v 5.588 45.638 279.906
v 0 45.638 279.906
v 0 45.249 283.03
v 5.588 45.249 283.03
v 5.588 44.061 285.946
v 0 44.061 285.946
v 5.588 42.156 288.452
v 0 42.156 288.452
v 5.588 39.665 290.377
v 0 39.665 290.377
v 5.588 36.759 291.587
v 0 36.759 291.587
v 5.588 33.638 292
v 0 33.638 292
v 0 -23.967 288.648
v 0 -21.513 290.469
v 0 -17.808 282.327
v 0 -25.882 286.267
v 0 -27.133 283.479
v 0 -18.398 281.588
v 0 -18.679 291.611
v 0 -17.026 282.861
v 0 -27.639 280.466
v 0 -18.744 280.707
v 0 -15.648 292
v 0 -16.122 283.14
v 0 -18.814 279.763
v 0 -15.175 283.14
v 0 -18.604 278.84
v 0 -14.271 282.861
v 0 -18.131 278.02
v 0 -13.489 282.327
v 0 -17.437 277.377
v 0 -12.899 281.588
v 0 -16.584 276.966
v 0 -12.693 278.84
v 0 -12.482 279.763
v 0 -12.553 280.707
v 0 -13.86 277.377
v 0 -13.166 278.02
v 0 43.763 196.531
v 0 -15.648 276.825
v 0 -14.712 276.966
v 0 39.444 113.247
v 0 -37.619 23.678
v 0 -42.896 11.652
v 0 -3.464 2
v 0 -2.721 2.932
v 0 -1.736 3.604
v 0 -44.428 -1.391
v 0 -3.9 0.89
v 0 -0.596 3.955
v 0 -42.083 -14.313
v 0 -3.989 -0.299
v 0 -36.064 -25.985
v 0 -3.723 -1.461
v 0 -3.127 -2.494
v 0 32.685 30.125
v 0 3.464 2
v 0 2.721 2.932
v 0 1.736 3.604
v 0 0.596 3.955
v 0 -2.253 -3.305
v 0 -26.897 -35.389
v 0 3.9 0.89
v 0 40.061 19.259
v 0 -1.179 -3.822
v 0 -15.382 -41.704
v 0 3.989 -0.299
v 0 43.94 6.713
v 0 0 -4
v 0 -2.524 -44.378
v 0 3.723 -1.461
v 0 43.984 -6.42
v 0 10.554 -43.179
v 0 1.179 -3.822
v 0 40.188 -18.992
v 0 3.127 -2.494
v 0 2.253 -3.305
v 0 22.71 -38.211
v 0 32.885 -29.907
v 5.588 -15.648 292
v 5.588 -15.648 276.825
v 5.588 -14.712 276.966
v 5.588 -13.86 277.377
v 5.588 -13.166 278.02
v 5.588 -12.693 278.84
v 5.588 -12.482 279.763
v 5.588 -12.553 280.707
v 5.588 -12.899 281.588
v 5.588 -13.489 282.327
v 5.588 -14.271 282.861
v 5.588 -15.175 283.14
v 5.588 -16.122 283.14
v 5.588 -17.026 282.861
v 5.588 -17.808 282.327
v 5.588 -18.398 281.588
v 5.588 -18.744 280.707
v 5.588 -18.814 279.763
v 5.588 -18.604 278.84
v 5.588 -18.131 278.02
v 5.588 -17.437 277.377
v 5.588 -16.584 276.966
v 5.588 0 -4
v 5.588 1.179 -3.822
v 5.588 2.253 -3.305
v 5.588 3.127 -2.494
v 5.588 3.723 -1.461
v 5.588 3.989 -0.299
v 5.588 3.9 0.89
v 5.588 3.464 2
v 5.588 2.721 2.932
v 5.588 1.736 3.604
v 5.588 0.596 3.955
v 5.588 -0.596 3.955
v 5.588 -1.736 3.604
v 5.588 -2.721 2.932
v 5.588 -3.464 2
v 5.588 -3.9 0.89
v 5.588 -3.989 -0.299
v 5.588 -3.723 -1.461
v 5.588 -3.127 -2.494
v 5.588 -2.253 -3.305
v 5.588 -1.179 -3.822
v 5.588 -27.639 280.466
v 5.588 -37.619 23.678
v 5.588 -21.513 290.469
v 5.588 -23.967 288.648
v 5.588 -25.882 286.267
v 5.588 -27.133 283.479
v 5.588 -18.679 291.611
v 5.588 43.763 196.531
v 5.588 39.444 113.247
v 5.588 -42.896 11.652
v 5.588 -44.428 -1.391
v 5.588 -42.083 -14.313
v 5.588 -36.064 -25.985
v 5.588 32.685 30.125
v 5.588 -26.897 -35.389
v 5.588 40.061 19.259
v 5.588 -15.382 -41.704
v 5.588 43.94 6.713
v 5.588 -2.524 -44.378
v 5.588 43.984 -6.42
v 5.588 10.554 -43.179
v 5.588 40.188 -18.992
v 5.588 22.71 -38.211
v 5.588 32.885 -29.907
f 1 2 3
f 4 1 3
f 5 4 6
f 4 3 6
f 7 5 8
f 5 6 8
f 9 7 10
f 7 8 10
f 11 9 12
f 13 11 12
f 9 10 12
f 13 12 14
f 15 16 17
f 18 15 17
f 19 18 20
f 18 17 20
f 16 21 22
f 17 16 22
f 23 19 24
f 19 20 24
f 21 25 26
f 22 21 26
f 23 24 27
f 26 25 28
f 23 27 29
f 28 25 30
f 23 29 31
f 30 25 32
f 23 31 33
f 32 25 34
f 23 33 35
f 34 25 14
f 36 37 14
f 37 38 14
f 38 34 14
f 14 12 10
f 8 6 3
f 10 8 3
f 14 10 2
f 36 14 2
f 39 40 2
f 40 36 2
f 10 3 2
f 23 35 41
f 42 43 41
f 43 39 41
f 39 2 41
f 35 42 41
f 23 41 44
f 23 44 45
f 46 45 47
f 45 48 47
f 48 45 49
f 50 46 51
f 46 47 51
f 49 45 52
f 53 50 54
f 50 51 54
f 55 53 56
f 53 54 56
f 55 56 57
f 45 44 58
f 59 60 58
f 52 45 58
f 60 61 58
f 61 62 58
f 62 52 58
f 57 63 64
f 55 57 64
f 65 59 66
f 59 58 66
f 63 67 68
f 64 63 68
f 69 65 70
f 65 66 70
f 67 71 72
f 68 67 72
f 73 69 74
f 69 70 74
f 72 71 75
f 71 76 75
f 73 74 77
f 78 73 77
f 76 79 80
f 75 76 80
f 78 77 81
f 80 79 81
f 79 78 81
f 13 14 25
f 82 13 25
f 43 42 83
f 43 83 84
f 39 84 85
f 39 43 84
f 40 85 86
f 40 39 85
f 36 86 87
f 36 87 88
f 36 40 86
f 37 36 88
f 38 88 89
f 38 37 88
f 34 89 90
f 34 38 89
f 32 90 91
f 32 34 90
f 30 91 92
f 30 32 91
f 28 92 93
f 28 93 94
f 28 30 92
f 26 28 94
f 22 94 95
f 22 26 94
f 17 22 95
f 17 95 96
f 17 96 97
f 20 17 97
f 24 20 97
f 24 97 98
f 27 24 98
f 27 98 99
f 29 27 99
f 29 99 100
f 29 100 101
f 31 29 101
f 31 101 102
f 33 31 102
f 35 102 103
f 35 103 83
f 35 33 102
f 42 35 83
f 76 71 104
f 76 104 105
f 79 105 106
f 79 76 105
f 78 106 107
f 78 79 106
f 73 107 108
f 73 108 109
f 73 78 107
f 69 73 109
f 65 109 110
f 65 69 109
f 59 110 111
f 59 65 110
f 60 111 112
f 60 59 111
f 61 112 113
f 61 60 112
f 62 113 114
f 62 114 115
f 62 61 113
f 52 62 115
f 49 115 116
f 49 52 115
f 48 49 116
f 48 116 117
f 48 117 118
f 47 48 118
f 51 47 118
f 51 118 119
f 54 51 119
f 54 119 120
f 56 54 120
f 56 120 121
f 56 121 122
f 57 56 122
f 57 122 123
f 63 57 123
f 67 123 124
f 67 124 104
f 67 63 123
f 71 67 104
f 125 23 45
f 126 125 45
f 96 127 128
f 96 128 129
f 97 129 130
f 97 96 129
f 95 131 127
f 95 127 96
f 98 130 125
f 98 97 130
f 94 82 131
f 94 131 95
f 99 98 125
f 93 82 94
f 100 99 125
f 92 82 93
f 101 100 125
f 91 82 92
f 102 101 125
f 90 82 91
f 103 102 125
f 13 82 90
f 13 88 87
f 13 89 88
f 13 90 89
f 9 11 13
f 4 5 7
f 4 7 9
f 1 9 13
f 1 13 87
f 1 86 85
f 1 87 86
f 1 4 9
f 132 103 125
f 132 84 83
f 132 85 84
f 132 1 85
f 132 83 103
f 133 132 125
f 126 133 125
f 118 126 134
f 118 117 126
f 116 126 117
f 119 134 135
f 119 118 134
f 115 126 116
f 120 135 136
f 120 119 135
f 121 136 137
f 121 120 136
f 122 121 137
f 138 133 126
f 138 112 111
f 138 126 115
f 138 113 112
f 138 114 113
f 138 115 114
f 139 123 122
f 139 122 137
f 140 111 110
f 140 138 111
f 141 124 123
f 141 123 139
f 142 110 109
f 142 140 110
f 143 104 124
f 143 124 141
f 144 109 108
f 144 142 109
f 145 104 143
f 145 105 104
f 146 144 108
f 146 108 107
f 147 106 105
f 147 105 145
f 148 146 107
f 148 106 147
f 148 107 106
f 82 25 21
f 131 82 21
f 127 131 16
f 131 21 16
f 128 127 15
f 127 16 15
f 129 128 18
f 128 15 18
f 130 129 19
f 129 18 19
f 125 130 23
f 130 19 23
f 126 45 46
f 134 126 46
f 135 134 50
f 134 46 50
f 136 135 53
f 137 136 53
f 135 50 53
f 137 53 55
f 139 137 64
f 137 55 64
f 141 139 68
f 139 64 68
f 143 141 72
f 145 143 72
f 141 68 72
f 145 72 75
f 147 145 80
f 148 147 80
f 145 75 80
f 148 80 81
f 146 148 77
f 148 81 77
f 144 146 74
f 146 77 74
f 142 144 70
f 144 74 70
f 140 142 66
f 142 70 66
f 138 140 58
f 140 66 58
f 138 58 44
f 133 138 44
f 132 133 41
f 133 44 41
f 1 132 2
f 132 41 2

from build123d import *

# Parameters (mm, degrees)
SKETCH2_R           = 4
SKETCH2_R_2         = 3.175
BOSS_EXTRUDE1_DEPTH = 5.588


with BuildPart() as part:
    # Sketch2 → Boss-Extrude1 (new body)
    with BuildSketch(Plane(origin=(0, 0, 0), x_dir=(0, 0, -1), z_dir=(1, 0, 0))):
        with BuildLine():
            Line((-292, 33.638045694), (-292, -15.648345659))
            ThreePointArc((-292, -15.648345659), (-288.648466484, -23.967241468), (-280.46599542, -27.639294256))
            Line((-280.46599542, -27.639294256), (-23.677807257, -37.618664829))
            ThreePointArc((-23.677807257, -37.618664829), (44.264265693, 4.059221924), (-30.124927866, 32.684724583))
            ThreePointArc((-30.124927866, 32.684724583), (-154.873072642, 41.908750383), (-279.906177735, 45.637678913))
            ThreePointArc((-279.906177735, 45.637678913), (-288.452045102, 42.156433663), (-292, 33.638045694))
        make_face()
        Circle(SKETCH2_R, mode=Mode.SUBTRACT)
        with Locations((-280, -15.648345659)):
            Circle(SKETCH2_R_2, mode=Mode.SUBTRACT)
    extrude(amount=BOSS_EXTRUDE1_DEPTH)


solid = part.part
